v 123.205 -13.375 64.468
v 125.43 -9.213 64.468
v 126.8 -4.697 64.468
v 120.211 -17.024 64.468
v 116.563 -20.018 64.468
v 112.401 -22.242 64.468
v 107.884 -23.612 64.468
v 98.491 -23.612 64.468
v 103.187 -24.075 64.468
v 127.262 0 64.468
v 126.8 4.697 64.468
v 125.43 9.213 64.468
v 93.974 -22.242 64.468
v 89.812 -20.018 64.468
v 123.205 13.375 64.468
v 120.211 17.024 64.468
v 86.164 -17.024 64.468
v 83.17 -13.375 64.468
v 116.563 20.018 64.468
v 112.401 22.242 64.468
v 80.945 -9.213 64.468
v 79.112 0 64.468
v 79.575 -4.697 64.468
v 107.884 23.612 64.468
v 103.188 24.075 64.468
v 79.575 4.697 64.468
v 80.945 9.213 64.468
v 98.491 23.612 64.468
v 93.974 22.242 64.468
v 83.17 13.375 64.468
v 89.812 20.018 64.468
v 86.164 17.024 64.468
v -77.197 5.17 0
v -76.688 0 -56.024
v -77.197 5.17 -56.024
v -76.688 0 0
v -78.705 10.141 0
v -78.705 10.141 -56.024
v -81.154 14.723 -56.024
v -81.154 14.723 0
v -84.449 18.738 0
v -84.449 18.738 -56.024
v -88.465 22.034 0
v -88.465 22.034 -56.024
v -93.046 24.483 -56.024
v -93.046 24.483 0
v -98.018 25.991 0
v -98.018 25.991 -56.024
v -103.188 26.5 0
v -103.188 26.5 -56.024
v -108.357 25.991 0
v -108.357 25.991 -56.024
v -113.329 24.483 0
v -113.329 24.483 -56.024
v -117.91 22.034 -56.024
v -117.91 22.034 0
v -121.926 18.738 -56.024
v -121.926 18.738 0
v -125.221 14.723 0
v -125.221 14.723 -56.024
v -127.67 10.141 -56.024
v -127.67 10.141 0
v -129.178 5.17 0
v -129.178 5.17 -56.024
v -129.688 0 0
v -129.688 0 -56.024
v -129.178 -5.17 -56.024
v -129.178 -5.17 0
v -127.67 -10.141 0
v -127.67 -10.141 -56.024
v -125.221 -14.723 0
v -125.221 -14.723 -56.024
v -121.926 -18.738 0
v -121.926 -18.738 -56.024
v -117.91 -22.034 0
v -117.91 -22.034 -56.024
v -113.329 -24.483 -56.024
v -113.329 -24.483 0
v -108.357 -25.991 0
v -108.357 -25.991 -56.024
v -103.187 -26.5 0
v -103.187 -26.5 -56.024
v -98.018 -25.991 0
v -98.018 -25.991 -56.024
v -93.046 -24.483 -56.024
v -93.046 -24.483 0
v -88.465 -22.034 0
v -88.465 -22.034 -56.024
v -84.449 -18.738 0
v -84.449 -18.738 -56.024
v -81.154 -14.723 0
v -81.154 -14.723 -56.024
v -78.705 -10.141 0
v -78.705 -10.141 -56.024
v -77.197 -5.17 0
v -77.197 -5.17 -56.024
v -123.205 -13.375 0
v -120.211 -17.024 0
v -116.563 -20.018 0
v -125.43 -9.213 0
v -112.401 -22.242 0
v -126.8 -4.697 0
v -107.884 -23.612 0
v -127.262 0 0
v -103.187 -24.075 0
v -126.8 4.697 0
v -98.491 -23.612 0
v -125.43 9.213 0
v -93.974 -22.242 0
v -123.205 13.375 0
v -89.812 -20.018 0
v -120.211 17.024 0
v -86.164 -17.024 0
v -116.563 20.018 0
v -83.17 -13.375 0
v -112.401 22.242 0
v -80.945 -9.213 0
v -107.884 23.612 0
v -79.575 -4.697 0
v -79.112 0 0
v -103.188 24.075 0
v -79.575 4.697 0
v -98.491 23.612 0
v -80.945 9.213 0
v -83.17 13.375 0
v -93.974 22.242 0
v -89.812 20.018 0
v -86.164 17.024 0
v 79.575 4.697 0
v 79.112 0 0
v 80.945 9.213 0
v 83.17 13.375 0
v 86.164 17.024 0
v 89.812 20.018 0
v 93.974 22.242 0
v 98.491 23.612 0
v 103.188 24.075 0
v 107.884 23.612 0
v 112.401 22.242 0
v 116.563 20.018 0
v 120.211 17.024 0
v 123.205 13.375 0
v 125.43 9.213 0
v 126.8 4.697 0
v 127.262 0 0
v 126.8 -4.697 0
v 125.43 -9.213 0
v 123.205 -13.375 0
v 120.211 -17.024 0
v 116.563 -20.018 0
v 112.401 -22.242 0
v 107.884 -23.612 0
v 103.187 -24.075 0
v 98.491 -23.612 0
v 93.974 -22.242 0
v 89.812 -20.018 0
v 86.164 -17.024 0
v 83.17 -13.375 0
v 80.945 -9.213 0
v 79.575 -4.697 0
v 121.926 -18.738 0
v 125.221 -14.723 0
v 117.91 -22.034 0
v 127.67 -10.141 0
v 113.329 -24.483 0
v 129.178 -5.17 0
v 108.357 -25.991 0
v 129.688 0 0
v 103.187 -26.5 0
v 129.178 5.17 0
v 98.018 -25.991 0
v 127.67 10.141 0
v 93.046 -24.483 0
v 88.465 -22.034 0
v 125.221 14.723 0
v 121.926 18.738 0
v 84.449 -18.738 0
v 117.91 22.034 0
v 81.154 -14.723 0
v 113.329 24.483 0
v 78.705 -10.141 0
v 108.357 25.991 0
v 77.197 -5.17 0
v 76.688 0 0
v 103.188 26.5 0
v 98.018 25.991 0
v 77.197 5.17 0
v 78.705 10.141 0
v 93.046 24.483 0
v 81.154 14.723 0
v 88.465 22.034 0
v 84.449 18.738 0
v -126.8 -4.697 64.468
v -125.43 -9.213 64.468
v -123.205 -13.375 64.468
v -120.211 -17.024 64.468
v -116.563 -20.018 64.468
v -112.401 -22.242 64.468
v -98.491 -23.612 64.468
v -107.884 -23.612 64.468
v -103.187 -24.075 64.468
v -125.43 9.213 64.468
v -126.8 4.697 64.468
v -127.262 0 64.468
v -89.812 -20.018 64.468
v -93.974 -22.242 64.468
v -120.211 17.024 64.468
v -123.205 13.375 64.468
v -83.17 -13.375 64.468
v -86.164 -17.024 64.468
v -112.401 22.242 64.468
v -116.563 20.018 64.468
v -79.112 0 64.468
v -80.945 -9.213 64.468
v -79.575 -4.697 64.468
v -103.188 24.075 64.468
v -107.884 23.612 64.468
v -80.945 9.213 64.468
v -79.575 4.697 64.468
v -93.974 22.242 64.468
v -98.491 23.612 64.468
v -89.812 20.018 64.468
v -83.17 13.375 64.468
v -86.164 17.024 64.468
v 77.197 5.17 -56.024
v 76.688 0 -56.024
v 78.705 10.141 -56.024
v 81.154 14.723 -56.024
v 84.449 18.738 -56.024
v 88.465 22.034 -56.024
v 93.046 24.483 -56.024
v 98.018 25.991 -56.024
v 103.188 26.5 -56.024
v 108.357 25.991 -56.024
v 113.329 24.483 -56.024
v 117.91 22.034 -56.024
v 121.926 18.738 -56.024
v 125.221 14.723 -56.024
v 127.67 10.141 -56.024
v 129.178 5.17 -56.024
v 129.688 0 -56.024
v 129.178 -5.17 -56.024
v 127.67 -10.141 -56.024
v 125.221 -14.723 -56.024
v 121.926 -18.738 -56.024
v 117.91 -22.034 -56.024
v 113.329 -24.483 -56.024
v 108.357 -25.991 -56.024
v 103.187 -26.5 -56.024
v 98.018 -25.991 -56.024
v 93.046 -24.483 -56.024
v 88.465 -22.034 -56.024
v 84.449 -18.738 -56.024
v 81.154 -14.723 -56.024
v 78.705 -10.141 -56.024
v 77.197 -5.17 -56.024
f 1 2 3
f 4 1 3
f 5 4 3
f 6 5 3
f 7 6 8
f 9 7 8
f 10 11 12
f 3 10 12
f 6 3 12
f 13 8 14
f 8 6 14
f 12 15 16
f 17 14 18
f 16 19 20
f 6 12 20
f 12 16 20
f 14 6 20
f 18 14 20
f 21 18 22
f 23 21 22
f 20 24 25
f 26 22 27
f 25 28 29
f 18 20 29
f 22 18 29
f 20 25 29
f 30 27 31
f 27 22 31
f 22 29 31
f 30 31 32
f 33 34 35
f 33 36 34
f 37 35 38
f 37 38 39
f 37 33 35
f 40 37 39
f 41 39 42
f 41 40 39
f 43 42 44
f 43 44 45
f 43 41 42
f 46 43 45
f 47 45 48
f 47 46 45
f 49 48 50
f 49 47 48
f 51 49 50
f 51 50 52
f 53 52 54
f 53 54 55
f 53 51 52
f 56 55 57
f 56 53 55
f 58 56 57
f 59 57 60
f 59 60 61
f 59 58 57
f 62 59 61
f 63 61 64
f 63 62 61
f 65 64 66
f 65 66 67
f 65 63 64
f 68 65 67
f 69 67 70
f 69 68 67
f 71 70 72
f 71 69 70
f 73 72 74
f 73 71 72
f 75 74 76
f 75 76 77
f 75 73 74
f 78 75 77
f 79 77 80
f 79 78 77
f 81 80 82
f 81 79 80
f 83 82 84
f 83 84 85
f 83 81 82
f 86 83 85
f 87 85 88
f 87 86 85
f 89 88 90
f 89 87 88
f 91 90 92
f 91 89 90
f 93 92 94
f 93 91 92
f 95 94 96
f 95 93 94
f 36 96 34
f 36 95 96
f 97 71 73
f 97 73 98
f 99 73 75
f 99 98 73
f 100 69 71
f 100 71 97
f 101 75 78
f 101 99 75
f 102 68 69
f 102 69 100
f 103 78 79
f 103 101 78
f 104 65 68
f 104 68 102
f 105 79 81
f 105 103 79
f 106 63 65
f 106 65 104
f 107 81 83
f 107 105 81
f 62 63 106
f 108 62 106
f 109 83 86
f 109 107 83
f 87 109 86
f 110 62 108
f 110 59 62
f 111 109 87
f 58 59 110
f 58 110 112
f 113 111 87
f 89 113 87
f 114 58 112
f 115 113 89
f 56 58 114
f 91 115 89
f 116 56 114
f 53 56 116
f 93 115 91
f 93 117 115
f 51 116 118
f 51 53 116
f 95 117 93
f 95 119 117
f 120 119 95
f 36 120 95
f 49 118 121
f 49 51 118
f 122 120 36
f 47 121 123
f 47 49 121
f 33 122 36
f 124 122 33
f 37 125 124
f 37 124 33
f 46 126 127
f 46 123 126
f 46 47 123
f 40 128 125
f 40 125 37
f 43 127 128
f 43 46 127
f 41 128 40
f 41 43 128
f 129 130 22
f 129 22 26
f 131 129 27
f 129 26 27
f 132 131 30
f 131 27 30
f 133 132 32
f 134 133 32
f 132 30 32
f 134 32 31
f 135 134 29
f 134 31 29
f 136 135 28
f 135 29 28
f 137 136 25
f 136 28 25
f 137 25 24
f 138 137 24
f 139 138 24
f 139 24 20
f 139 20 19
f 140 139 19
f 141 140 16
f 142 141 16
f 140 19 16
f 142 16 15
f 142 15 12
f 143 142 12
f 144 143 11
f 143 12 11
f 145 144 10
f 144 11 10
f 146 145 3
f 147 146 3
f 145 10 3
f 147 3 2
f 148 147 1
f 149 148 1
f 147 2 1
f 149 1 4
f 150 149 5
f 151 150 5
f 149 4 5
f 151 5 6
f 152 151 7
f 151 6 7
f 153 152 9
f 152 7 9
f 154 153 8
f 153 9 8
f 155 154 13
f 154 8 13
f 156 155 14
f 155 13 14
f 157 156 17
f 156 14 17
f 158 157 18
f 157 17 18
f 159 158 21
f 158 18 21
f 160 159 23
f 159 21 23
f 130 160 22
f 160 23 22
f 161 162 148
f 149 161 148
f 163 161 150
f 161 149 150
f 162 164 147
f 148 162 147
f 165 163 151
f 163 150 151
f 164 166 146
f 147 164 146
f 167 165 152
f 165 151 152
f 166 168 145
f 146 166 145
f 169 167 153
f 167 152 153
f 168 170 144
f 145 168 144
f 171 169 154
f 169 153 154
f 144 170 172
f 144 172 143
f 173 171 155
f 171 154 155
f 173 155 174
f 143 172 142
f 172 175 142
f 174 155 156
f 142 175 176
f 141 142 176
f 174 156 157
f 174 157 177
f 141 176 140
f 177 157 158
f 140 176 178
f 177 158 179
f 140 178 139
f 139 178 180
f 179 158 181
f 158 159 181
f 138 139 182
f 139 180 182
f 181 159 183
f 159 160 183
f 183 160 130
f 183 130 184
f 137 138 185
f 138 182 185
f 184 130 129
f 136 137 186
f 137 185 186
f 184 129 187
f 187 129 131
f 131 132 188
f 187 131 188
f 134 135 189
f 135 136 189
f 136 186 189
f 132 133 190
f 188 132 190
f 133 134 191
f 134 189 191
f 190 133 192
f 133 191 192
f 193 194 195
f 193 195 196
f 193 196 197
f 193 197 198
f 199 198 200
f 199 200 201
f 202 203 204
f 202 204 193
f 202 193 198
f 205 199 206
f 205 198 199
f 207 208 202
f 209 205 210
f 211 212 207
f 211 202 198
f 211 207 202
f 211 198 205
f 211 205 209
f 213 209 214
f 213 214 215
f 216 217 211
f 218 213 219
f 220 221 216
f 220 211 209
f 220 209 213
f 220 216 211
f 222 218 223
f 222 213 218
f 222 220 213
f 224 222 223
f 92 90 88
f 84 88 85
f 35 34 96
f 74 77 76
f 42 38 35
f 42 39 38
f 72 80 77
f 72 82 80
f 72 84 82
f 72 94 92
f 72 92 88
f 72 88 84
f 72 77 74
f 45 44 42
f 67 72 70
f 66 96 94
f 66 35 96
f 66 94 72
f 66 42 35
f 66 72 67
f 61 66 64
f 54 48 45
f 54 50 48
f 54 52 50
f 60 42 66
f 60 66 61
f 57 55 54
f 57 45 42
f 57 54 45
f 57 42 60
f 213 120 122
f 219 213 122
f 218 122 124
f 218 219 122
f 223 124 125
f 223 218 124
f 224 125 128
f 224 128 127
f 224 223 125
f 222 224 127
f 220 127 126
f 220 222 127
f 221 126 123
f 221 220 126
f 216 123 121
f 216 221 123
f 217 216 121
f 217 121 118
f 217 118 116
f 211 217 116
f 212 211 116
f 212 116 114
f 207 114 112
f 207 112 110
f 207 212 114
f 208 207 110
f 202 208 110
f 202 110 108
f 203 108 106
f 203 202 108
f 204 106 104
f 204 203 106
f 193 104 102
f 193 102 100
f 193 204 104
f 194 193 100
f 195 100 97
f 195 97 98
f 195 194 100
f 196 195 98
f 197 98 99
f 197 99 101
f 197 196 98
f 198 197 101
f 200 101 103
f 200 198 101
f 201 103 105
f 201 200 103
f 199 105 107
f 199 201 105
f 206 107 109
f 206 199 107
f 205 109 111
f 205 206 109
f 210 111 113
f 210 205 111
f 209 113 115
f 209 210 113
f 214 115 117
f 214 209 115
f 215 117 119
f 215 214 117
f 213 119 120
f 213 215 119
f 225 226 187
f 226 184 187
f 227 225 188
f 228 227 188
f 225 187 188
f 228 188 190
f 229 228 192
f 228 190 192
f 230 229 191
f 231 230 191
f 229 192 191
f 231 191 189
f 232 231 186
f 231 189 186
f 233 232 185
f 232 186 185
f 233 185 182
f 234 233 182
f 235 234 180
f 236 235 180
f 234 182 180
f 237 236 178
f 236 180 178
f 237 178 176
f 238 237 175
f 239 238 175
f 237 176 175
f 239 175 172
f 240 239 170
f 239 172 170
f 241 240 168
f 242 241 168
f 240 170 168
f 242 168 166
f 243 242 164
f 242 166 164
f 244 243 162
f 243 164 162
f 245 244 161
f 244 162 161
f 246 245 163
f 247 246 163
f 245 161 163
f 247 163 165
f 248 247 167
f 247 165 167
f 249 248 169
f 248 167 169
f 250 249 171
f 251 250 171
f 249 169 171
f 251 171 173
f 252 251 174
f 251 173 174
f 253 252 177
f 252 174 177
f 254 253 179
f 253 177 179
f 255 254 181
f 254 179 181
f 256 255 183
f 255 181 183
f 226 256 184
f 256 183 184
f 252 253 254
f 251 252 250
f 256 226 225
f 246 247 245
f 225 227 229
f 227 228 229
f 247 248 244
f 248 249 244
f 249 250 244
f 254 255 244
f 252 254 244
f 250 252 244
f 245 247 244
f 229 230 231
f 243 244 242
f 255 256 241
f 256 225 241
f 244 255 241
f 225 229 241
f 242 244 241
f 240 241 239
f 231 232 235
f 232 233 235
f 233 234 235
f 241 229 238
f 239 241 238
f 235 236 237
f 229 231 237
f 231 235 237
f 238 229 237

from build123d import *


with BuildPart() as f1:
    # F0 (on Front) → F1 (revolve)
    with BuildSketch(Plane.XZ):
        Polygon((-79.1125, 64.468499), (-103.1875, 64.468499), (-103.1875, 0), (-103.1875, -56.024422), (-76.6875, -56.024422), (-76.6875, 0), (-79.1125, 0), align=None)
    revolve(axis=Axis((-103.1875, 0, 56.685284), (0, 0, 1)))


with BuildPart() as f2_1:
    # F2: instance of F1
    add(f1.part.mirror(Plane.YZ))


solid = Compound([f1.part, f2_1.part])
